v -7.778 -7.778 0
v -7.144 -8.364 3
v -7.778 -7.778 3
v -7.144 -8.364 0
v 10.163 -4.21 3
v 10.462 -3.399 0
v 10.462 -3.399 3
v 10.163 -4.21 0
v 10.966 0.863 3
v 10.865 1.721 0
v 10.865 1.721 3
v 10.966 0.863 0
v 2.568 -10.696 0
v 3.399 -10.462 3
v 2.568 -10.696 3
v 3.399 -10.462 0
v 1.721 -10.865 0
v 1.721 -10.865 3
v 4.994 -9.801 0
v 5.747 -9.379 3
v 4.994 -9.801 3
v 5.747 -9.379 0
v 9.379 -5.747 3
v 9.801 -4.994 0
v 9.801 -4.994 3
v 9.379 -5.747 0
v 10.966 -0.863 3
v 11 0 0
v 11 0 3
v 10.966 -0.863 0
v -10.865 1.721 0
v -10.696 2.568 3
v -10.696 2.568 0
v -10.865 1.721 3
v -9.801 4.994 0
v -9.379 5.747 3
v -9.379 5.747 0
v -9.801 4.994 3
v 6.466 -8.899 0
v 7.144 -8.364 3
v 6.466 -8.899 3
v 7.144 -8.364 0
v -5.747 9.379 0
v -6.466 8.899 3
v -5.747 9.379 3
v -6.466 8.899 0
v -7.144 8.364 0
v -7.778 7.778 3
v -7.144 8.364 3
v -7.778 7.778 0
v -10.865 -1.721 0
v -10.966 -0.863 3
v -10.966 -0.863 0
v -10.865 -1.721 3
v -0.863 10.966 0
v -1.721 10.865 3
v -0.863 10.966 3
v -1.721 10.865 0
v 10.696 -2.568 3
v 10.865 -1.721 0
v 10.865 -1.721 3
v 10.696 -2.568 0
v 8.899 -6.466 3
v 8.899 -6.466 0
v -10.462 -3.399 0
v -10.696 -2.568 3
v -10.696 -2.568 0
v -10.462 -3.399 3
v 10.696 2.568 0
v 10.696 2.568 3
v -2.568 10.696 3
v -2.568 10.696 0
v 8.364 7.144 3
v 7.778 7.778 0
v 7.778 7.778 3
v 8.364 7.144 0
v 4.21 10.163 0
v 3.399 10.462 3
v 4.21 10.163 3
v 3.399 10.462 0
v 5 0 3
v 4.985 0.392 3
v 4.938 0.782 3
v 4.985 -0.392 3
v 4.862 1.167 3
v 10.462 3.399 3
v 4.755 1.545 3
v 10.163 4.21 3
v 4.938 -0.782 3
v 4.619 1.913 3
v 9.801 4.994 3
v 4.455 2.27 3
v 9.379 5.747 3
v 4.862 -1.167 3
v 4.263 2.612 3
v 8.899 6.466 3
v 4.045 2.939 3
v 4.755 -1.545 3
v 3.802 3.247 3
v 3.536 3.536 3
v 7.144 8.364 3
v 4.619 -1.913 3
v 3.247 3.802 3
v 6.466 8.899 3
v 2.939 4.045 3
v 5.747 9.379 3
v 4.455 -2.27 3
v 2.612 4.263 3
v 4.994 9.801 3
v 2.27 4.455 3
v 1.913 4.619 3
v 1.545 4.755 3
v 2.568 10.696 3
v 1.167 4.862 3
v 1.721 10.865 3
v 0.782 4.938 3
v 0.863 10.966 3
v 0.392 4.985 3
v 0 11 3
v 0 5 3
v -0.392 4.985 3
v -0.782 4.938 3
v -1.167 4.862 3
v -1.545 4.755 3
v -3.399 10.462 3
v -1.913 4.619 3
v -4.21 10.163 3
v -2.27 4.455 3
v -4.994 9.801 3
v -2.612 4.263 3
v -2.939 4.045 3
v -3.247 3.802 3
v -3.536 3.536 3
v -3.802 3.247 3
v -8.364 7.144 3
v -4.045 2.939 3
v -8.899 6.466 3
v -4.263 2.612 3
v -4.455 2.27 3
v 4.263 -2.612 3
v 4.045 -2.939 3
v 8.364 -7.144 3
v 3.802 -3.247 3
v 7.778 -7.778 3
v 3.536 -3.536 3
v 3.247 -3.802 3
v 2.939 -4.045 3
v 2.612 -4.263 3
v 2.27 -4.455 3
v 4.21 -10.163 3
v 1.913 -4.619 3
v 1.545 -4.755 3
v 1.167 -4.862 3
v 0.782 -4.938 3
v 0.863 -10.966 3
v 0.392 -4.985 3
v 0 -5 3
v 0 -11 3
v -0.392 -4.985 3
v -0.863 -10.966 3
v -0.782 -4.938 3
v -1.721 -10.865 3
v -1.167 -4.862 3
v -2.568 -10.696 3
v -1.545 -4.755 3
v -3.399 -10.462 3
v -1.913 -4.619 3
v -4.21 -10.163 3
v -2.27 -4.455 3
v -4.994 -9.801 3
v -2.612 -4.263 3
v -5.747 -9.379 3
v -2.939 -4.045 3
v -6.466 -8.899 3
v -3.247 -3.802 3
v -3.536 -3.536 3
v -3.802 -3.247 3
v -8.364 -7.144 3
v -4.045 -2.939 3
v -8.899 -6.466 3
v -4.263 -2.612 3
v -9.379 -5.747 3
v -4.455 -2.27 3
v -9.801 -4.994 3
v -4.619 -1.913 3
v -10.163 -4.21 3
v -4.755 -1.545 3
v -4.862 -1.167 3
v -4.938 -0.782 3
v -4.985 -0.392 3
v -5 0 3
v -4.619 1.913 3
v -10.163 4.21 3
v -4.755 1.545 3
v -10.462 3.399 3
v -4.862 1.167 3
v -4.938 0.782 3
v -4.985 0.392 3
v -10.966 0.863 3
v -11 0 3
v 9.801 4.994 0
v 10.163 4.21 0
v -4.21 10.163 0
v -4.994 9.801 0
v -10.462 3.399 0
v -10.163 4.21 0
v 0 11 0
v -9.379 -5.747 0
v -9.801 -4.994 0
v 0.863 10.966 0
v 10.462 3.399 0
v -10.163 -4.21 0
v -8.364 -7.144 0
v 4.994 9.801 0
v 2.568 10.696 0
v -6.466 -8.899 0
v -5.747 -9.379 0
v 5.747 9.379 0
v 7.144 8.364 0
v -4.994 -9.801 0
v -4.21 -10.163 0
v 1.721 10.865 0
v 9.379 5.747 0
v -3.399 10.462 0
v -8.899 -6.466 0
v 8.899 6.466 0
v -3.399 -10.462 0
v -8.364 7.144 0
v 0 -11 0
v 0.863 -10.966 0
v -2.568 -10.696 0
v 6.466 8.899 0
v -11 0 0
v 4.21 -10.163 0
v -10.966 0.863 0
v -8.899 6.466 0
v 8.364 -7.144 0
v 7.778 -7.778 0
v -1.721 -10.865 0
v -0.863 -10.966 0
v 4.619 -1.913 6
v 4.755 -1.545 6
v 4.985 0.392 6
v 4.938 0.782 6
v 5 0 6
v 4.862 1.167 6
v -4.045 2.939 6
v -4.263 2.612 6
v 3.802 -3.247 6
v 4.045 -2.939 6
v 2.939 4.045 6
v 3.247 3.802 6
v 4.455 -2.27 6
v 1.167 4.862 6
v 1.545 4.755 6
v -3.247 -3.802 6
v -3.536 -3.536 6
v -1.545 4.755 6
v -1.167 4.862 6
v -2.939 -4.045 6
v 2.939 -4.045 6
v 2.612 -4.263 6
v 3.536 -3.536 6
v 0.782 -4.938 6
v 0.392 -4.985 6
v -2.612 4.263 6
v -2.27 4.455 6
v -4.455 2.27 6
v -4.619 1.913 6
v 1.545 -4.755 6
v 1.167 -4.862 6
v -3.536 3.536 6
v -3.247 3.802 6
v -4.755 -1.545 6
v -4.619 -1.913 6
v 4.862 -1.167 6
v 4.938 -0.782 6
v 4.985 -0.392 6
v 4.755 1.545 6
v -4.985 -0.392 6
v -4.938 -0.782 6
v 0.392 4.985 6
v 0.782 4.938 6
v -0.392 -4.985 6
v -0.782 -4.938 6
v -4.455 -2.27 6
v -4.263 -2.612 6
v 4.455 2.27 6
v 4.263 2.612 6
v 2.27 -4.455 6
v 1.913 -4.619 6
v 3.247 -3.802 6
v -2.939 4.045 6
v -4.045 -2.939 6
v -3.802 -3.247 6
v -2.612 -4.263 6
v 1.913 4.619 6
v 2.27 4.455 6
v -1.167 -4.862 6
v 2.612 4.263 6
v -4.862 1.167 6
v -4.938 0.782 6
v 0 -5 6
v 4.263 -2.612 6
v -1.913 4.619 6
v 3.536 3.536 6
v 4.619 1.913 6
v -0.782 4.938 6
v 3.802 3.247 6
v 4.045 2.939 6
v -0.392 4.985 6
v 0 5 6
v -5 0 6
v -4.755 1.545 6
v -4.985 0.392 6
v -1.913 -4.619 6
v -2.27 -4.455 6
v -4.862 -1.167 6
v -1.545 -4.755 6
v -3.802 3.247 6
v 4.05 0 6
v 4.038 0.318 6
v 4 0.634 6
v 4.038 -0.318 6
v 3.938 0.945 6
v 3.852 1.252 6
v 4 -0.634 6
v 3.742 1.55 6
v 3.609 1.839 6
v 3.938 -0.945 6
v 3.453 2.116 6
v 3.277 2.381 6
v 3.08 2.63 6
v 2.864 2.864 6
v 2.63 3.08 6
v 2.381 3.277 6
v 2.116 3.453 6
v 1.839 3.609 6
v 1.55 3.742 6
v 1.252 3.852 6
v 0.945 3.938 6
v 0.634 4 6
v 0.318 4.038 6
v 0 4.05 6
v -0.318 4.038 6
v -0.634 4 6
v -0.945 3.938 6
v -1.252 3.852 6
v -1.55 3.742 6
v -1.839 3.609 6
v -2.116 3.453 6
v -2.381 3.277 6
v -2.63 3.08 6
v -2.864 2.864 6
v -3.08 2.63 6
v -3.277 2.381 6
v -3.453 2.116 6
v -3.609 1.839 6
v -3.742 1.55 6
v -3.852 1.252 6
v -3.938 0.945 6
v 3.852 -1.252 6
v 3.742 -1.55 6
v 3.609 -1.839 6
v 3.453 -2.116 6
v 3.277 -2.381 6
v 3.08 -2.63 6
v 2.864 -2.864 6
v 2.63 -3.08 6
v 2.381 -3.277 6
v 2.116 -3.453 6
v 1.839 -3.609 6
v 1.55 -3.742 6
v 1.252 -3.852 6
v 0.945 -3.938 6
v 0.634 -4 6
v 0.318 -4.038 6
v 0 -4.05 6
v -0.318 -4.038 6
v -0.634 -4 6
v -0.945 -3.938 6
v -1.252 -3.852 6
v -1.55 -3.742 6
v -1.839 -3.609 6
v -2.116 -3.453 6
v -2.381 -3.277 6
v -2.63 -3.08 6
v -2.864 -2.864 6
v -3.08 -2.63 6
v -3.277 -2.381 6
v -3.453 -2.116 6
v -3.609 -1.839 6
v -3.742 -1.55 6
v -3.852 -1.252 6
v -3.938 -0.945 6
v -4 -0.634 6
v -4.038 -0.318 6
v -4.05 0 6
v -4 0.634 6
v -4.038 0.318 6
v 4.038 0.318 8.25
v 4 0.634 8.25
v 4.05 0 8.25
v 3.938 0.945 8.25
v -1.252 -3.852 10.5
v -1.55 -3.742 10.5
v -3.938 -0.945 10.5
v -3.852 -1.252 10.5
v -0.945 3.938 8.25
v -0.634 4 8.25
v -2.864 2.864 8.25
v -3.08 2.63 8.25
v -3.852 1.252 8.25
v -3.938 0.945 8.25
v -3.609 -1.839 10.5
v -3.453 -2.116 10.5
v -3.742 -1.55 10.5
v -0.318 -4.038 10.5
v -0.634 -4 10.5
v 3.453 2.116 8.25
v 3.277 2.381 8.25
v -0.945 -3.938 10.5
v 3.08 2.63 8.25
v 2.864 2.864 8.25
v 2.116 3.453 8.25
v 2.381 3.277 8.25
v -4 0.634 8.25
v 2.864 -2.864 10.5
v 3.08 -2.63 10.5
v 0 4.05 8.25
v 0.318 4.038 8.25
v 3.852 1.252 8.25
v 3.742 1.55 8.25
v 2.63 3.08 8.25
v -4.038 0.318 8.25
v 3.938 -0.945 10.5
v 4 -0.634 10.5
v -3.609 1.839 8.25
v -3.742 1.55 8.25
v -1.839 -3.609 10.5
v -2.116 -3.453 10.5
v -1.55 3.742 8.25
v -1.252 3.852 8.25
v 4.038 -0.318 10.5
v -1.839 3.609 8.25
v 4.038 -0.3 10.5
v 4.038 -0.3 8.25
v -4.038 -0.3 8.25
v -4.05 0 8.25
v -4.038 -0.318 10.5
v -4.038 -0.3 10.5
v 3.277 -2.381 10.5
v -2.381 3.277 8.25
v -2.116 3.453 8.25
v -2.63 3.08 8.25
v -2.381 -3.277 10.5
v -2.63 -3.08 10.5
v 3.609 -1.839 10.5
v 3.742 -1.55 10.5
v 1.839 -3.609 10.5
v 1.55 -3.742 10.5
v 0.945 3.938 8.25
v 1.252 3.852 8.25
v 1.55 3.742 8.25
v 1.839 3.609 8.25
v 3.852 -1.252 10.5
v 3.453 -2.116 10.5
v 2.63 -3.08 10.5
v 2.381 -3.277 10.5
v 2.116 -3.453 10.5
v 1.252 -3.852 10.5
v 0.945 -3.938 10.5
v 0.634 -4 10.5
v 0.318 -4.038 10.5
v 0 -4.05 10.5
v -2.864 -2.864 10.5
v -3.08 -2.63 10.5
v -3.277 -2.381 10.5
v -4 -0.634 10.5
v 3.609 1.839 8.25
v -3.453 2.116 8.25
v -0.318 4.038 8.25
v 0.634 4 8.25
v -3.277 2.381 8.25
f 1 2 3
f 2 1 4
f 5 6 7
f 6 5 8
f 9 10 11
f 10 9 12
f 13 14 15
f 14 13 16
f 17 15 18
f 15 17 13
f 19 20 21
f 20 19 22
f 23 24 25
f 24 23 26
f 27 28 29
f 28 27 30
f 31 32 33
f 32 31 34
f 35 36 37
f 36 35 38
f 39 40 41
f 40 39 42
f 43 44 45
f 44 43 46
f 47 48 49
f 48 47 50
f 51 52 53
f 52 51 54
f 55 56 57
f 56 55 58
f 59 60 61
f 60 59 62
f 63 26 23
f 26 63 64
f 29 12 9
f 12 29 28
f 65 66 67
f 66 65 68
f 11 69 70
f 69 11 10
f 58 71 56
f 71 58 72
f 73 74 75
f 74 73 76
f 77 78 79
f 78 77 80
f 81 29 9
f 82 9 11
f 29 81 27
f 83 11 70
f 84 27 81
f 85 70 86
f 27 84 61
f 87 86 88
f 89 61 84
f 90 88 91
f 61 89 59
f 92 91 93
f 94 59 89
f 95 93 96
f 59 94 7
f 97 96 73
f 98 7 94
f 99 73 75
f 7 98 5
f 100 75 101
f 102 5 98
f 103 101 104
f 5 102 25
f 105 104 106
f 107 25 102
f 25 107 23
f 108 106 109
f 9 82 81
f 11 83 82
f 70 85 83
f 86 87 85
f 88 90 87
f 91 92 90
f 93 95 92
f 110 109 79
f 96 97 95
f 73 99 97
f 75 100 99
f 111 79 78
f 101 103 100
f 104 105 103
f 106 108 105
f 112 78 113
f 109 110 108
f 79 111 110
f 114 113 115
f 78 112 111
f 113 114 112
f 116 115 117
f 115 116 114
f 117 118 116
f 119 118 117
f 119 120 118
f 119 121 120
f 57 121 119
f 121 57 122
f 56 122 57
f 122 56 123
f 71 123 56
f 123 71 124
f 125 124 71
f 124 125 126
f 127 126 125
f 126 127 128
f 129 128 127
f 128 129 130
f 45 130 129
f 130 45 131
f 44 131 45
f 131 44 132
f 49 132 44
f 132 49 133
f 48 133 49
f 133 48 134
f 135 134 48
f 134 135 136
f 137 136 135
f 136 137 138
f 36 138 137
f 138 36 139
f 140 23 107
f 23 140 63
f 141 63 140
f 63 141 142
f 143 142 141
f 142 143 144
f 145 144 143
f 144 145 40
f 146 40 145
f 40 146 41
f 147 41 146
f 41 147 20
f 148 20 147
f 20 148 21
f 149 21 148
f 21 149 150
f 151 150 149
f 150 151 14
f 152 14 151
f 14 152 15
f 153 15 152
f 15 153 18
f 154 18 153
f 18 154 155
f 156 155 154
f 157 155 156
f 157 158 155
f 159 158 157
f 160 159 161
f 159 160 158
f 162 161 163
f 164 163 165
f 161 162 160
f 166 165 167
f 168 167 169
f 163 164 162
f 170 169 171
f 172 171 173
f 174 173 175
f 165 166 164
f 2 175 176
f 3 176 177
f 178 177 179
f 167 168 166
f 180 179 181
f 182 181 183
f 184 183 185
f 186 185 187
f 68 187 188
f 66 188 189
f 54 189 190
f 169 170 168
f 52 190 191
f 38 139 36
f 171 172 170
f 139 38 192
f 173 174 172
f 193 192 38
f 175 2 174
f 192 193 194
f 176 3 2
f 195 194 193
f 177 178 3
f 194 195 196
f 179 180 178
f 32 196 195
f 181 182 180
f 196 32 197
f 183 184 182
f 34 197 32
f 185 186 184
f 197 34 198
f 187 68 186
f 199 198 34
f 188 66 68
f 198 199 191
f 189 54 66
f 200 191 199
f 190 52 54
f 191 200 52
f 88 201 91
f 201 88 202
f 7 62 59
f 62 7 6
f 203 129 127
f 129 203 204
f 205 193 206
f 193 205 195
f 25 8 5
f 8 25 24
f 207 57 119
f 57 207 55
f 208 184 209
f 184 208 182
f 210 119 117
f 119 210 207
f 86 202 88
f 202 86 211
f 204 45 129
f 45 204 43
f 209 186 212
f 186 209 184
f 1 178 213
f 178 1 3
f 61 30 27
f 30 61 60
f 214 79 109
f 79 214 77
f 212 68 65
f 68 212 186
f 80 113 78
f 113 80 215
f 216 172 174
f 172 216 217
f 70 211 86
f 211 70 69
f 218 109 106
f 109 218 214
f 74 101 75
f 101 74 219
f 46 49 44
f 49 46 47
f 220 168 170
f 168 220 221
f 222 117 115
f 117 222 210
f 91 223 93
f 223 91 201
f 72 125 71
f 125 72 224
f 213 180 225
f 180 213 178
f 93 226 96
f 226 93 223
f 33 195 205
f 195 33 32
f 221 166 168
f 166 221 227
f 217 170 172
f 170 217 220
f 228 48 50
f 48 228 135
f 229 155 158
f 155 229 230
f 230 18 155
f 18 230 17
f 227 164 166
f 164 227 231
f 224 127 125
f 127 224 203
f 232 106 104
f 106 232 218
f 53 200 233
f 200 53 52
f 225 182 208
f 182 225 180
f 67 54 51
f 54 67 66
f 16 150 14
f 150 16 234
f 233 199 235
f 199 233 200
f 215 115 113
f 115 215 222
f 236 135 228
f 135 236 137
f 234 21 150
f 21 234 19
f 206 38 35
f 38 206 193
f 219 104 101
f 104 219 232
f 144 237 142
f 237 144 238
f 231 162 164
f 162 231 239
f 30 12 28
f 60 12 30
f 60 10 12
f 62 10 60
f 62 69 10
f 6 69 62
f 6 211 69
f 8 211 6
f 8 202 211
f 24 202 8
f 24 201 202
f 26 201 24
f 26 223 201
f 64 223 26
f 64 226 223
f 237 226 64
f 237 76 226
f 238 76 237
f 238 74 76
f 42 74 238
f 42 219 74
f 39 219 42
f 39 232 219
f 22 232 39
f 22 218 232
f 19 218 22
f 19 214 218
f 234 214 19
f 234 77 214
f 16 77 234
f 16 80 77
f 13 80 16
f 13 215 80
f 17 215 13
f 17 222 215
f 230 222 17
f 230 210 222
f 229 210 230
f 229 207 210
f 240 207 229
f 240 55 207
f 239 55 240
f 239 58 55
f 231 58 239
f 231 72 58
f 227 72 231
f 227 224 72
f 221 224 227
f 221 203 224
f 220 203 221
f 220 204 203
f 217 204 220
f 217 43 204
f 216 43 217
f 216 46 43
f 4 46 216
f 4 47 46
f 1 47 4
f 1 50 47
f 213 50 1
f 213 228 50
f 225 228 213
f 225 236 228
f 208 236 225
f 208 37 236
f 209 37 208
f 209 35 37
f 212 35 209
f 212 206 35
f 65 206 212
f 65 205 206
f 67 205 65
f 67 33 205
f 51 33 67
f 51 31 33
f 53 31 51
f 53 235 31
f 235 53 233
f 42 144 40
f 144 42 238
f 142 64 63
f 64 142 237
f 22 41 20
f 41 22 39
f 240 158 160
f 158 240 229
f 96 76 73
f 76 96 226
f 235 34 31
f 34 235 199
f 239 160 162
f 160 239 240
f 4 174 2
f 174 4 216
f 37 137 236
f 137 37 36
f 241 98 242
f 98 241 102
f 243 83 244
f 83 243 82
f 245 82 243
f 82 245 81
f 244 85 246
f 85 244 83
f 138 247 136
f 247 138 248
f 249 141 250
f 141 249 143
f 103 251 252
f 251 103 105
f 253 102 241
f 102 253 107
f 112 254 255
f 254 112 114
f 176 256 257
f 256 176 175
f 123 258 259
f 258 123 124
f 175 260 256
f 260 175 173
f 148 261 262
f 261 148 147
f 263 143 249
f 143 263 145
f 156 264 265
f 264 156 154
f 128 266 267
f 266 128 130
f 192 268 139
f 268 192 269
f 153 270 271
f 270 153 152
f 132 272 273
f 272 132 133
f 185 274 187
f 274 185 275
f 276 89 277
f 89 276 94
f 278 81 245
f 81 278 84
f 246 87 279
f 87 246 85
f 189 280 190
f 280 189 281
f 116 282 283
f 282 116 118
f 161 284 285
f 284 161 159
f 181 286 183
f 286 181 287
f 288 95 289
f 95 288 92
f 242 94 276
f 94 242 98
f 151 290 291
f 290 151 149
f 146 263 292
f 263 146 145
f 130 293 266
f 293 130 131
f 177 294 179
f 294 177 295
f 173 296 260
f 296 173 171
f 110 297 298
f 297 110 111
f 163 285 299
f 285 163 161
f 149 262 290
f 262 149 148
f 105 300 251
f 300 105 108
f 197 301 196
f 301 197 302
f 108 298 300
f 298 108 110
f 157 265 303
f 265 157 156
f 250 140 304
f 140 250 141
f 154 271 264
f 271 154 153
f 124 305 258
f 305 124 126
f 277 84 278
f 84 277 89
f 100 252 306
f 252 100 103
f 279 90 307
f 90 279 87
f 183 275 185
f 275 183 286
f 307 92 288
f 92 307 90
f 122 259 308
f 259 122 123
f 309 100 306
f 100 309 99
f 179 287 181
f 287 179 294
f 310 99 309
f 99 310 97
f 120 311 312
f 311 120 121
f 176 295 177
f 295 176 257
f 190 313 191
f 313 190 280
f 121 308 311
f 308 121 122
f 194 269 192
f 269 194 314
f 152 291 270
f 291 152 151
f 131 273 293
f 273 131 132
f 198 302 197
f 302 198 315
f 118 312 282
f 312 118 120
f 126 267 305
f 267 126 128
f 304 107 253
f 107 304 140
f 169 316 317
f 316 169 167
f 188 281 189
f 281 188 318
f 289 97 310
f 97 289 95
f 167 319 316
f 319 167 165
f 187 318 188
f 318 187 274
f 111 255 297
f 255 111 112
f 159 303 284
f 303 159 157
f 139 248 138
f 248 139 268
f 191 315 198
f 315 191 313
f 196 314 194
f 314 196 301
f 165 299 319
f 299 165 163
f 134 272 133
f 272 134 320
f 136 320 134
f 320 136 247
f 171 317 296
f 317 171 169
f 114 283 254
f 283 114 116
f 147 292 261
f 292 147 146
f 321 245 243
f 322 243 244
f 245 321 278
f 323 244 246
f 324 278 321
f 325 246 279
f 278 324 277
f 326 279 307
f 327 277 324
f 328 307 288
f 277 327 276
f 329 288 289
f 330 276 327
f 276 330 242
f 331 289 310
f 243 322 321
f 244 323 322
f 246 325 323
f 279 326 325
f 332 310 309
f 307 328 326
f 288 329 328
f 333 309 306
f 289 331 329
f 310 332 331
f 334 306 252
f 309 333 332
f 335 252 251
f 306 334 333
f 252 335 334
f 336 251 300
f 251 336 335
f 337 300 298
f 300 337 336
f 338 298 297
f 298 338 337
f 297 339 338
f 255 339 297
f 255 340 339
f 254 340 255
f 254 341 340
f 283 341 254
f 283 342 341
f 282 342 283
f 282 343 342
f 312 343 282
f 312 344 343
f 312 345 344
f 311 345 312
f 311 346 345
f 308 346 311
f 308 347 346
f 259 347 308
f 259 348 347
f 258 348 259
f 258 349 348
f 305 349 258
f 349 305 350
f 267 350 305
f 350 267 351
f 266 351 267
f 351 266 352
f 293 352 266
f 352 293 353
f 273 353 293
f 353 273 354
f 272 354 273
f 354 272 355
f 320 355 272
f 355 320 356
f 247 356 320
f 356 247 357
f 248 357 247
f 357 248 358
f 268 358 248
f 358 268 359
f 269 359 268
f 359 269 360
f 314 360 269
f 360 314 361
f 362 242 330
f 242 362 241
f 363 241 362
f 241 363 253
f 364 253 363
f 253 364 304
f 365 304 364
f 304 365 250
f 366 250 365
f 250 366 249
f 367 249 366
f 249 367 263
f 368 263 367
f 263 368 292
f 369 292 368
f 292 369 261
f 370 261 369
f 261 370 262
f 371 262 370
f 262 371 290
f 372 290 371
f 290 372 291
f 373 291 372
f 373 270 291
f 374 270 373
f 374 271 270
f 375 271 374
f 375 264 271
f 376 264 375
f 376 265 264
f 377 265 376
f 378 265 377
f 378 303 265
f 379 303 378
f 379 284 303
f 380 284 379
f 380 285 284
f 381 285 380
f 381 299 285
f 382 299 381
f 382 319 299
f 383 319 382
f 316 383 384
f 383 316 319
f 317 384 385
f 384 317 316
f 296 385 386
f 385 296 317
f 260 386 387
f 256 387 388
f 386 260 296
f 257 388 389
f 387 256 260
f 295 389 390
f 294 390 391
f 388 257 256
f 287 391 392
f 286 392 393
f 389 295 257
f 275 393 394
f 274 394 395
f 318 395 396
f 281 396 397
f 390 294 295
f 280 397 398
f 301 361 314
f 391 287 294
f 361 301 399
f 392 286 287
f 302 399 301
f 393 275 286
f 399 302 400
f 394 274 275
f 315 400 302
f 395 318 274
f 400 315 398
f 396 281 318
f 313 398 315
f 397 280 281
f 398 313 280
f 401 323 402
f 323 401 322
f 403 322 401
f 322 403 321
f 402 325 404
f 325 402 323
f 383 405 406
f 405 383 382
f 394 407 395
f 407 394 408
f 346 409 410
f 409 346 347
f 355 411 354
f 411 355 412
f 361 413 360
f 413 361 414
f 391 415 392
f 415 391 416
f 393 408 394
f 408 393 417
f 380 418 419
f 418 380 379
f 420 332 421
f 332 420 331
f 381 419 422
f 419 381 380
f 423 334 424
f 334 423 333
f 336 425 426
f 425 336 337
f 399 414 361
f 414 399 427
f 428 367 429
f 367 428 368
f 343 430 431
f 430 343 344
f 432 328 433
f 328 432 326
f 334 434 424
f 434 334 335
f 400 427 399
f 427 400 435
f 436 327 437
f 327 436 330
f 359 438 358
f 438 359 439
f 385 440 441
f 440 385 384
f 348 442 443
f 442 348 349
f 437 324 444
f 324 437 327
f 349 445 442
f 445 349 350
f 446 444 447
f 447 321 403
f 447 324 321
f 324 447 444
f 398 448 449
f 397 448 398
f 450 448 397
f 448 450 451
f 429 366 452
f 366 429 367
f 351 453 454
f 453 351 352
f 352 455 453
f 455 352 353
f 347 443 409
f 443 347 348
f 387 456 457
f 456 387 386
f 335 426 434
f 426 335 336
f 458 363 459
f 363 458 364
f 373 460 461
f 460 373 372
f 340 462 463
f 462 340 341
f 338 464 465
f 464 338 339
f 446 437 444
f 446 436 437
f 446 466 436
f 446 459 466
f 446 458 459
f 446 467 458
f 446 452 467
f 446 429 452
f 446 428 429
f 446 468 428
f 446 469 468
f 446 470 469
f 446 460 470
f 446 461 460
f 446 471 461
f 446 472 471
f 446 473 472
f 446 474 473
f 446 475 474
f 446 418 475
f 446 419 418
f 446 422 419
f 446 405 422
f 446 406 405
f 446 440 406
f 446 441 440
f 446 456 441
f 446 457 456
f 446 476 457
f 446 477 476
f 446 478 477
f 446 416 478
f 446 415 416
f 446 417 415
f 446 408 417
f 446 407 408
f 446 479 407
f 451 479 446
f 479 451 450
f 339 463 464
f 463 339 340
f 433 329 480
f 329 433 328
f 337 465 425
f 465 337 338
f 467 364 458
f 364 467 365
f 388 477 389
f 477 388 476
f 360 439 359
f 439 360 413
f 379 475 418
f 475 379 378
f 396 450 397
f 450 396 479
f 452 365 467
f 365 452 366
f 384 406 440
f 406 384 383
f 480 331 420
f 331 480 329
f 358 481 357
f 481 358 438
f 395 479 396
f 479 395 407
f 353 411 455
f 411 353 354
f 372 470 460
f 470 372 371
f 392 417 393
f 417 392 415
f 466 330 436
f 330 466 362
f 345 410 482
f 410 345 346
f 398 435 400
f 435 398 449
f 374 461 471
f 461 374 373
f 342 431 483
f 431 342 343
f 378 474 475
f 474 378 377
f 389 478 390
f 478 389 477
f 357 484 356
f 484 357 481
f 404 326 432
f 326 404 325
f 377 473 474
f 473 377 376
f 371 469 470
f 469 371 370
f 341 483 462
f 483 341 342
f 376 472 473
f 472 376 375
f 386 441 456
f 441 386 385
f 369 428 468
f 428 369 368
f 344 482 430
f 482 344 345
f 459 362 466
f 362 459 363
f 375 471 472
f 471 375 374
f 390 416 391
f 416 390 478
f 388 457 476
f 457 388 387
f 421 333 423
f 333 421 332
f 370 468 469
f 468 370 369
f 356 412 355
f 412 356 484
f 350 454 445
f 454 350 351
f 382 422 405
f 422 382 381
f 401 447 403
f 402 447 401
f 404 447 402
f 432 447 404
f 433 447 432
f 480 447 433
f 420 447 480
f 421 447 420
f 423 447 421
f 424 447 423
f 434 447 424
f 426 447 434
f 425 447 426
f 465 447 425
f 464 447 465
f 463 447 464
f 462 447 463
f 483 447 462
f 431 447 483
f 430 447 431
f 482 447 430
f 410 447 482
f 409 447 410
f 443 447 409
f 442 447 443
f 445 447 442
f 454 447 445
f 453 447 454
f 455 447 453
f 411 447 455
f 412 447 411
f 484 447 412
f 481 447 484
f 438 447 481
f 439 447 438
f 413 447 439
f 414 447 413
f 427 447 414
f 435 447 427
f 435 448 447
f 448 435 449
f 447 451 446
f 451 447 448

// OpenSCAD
// Original
//!translate([0,0,1.5]) import("spinnerHub.stl");

outer_d = 22;
outer_h = 3;

base_d = 10;
base_h = 3; // orig 1 for a 7 mm thick bearing

hub_d = 8.1; // orig 8. OR 4.1 x 2 ?
hub_h = 4.5; // orig 4.5, perfect when the total height is 7
// 7 + 2 / 2 = 4.5
// 10 + 2 / 2 = 6
hub_gap = 0.30; // orig 0.5

//Default values
$fn=80;

difference() {
    union() {
cylinder(d = outer_d, h = outer_h);

translate([0,0,outer_h])
cylinder(d = base_d, h = base_h);

translate([0,0,outer_h+base_h])
cylinder(d = hub_d, h = hub_h);

    }

// cut away a half
translate([-hub_d/2-1,-hub_gap,outer_h+base_h+hub_h/2]) cube([hub_d+2,hub_d+2,hub_h]);

}
